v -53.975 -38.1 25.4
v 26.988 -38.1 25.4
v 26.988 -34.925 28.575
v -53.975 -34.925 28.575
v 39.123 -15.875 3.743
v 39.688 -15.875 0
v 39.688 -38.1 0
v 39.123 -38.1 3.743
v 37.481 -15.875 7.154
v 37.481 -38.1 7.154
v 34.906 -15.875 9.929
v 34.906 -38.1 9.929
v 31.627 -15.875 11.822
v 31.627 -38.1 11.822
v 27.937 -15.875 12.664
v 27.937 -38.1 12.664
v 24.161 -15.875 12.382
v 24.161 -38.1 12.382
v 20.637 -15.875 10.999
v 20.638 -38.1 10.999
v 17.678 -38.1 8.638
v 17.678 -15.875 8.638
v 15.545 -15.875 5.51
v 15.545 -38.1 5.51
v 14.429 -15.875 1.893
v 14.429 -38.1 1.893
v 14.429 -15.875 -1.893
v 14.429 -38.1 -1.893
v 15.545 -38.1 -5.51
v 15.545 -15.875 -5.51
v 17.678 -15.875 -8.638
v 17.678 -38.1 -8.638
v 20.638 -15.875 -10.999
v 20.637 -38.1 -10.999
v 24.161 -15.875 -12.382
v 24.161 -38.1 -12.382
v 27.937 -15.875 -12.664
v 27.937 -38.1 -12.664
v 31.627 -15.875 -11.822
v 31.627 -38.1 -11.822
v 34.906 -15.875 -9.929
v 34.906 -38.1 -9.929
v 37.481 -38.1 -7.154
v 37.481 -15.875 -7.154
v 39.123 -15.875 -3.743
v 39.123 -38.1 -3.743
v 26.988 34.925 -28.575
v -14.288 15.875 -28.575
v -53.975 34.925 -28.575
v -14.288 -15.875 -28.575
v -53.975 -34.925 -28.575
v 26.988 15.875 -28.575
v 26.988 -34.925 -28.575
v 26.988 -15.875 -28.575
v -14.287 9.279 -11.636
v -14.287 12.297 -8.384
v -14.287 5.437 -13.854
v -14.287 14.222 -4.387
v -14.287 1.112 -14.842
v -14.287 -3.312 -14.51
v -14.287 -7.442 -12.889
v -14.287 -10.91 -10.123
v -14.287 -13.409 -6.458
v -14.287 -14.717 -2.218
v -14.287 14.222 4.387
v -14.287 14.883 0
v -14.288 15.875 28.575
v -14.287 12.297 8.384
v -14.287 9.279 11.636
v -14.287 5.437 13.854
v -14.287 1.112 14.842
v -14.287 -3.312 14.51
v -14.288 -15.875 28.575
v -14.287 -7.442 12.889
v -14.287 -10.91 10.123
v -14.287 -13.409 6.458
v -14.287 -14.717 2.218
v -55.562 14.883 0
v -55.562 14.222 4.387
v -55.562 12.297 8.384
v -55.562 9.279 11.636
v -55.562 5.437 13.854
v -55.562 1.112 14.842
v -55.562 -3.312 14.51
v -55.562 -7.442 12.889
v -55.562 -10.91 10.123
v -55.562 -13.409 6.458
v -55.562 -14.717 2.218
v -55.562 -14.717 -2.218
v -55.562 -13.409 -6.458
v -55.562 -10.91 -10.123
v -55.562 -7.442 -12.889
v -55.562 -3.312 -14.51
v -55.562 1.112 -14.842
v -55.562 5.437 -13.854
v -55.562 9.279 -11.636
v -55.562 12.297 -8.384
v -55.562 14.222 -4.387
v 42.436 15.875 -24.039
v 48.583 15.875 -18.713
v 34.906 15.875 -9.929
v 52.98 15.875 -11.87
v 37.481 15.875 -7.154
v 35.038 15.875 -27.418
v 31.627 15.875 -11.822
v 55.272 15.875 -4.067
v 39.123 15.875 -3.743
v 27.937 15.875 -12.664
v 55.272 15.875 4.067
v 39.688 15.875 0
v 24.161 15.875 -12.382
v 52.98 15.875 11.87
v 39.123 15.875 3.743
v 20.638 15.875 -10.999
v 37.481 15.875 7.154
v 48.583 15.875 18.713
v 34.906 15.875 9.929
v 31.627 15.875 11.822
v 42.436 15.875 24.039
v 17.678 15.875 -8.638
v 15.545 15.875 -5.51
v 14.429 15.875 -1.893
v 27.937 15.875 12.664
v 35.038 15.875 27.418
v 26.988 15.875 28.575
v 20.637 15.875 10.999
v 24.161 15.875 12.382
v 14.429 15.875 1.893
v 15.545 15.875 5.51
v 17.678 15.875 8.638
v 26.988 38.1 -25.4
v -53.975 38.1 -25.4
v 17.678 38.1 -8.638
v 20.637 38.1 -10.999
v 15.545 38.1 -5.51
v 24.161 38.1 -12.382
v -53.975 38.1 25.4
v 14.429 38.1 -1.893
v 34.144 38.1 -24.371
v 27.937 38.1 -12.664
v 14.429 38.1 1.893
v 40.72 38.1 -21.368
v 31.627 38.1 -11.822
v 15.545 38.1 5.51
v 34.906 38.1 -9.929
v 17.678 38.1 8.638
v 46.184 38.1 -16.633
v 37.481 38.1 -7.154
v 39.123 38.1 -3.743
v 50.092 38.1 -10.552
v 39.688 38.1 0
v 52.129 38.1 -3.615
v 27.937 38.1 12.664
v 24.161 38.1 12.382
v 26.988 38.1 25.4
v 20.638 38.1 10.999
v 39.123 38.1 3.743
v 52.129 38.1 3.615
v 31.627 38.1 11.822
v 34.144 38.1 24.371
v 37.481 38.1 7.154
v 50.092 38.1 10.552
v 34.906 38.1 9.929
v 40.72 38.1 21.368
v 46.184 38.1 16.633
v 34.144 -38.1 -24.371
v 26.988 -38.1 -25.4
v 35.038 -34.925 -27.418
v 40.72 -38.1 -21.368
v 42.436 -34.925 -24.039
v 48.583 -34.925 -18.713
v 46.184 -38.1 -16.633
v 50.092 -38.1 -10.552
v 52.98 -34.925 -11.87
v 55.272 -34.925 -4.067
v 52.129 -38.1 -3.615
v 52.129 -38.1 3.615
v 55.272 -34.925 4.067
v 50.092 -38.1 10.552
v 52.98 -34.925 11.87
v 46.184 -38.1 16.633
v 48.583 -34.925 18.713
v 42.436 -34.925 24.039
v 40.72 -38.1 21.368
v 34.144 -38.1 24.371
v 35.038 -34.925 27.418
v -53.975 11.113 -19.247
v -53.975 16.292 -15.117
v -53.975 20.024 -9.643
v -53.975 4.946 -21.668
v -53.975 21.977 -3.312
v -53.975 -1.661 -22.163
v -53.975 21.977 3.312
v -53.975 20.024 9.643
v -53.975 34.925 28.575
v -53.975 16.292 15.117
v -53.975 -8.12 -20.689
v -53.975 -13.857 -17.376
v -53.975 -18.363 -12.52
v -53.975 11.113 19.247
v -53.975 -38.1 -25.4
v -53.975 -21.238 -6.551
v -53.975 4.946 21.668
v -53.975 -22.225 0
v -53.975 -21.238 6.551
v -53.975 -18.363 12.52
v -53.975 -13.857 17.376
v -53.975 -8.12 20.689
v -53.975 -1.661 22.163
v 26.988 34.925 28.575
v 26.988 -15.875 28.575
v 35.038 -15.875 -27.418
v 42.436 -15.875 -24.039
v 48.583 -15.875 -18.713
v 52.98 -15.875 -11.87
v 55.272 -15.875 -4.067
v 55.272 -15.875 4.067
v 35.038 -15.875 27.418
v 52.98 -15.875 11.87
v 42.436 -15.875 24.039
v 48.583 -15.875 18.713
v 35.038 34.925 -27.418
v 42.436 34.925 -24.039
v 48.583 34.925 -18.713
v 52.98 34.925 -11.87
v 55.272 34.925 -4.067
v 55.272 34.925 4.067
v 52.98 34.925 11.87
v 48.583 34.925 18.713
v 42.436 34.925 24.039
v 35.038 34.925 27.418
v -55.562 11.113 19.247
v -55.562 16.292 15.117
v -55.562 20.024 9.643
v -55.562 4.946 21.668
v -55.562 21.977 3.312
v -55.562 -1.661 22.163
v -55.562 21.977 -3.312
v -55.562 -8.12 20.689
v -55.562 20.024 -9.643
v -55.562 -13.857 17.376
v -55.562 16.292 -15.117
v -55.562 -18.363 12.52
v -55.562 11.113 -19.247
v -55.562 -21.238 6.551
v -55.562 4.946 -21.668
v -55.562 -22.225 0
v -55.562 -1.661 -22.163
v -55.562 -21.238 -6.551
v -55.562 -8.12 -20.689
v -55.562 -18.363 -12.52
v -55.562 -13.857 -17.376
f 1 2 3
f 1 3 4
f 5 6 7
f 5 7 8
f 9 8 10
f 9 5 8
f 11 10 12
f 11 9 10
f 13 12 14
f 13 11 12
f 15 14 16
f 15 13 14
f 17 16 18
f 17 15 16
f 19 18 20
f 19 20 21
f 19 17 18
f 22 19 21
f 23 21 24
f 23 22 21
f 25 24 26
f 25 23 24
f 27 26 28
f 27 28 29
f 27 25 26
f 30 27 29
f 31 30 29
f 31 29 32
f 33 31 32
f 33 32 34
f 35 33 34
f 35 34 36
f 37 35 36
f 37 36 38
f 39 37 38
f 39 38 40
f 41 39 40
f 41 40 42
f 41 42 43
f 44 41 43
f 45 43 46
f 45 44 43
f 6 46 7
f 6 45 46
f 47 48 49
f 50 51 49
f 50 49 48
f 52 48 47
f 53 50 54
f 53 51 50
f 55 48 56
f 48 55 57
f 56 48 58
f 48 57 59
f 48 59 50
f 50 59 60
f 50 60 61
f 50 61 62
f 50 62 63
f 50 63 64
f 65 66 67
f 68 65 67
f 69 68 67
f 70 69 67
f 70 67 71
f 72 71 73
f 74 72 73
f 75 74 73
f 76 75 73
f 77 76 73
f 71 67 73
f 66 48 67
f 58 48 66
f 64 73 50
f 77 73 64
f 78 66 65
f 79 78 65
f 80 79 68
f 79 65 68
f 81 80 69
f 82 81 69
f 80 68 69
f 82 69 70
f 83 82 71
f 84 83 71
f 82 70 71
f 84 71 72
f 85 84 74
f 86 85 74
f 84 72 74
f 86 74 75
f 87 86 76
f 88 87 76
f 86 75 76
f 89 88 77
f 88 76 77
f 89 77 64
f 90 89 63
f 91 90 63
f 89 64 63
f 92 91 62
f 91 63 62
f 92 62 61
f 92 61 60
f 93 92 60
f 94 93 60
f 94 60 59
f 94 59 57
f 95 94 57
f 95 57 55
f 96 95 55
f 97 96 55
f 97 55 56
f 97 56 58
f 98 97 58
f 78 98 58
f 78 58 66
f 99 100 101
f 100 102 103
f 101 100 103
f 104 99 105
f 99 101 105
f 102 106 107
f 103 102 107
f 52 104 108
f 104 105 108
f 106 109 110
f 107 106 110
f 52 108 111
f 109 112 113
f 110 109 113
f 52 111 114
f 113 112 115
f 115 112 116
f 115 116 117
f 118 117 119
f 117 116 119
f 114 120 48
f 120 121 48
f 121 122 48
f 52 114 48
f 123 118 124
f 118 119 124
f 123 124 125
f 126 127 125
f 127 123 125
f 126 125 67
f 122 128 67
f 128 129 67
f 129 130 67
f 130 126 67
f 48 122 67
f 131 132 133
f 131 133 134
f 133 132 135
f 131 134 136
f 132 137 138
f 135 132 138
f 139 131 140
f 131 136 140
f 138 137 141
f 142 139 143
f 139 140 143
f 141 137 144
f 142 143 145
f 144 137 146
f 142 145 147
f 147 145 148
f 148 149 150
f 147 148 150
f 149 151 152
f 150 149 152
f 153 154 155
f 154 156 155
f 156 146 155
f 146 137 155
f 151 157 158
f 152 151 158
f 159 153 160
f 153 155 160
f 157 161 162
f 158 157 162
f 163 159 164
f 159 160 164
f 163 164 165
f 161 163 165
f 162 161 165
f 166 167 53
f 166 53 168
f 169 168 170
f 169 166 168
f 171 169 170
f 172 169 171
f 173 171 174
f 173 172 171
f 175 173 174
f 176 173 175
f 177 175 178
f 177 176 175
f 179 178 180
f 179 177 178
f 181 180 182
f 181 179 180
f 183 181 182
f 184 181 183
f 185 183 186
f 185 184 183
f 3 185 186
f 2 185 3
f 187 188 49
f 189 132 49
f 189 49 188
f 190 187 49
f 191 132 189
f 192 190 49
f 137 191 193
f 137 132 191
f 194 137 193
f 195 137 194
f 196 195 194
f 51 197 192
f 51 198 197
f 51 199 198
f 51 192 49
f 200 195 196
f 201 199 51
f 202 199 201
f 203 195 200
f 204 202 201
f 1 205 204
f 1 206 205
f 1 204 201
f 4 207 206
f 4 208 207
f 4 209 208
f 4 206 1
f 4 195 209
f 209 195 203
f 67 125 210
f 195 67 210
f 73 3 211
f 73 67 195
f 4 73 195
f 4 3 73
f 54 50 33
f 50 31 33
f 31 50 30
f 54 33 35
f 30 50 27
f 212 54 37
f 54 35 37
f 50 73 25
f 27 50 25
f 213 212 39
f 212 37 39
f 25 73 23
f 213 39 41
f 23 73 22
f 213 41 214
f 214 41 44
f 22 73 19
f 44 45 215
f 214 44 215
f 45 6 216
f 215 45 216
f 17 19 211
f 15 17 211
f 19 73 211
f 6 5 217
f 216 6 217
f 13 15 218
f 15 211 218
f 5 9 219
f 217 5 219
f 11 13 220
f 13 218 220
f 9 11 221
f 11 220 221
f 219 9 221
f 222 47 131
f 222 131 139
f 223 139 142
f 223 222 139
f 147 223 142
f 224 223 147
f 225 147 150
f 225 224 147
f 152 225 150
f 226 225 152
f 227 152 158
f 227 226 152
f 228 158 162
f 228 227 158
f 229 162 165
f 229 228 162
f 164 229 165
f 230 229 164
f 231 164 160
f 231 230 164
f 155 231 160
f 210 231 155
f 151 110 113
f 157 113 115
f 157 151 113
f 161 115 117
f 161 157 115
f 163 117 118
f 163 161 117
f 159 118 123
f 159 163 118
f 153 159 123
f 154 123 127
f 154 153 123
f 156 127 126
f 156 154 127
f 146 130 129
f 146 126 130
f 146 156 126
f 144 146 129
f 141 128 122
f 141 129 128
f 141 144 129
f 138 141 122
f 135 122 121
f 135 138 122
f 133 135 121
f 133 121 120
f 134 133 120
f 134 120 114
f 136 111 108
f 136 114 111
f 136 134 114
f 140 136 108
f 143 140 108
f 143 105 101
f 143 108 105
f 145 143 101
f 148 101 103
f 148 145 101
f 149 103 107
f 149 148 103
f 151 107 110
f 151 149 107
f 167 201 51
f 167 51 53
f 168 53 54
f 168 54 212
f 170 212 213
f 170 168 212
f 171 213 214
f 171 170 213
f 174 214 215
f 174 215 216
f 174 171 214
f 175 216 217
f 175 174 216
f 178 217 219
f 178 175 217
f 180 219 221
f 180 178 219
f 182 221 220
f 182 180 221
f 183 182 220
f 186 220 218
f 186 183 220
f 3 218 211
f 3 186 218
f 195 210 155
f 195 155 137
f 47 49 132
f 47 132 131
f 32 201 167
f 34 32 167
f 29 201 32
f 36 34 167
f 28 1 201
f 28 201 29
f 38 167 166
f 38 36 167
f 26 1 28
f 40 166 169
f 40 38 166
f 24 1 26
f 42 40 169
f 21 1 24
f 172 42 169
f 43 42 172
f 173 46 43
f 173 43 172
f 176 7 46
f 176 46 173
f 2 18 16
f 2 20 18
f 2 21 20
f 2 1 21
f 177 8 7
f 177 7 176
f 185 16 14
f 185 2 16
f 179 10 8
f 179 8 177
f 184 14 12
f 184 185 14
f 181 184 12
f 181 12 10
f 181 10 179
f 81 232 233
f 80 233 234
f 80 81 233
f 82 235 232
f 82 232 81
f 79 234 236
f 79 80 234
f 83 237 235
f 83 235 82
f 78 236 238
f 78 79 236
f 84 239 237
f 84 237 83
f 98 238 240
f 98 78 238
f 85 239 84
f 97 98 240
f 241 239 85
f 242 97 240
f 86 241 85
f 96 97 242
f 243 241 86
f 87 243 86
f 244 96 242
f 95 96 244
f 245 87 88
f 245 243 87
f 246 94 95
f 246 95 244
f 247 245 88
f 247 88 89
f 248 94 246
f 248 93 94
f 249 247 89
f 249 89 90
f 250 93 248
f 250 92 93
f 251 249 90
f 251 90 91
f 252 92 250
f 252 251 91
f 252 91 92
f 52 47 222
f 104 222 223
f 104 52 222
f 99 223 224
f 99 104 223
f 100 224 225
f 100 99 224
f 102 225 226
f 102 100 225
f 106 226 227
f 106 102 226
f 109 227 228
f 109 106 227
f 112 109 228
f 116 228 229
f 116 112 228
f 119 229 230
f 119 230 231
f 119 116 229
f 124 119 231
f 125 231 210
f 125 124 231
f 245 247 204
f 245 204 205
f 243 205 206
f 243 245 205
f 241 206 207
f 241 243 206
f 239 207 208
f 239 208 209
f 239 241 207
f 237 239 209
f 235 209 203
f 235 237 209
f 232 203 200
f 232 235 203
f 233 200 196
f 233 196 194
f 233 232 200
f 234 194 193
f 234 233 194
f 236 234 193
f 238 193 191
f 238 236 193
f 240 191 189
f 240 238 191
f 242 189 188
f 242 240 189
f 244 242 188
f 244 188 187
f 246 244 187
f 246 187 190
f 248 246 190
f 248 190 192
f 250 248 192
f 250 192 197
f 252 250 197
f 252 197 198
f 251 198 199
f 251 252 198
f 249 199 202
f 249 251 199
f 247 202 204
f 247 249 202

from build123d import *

# Parameters (mm, degrees)
F0_R     = 12.7
F1_DEPTH = 38.1
F3_DEPTH = 38.1
F5_D     = 29.76626
F4_W     = 76.2
F4_H     = 57.15
F4_R     = 22.225
F6_DEPTH = 1.5875
F7_SIZE  = 3.175


with BuildPart() as f1:
    # F0 (on Front) → F1 (new body, symmetric)
    with BuildSketch(Plane.XZ):
        with BuildLine():
            Line((-55.5625, 28.575), (-55.5625, -28.575))
            Line((-55.5625, -28.575), (26.9875, -28.575))
            ThreePointArc((26.9875, -28.575), (55.5625, 0), (26.9875, 28.575))
            Line((26.9875, 28.575), (-55.5625, 28.575))
        make_face()
        with Locations((26.9875, 0)):
            Circle(F0_R, mode=Mode.SUBTRACT)
    extrude(amount=F1_DEPTH, both=True)

    # F2 (on Top) → F3 (cut, symmetric)
    with BuildSketch(Plane.XY):
        Polygon((55.5625, 0), (55.5625, 15.875), (-14.2875, 15.875), (-14.2875, 0), (-14.2875, -15.875), (55.5625, -15.875), align=None)
    extrude(amount=F3_DEPTH, both=True, mode=Mode.SUBTRACT)

    # F5 (through all)
    with Locations(Plane(origin=(-55.5625, 0, 0), x_dir=(0, -1, 0), z_dir=(-1, 0, 0))):
        with Locations((0, 0)):
            Hole(F5_D / 2)

    # F4 (on face) → F6 (cut)
    with BuildSketch(Plane(origin=(-55.5625, 0, 0), x_dir=(0, -1, 0), z_dir=(-1, 0, 0))):
        Rectangle(F4_W, F4_H)
        Circle(F4_R, mode=Mode.SUBTRACT)
    extrude(amount=-F6_DEPTH, mode=Mode.SUBTRACT)

    # F7
    f7_edges = [f1.edges().sort_by_distance(p)[0] for p in [
        (-13.49375, 38.1, 28.575),
        (-13.49375, -38.1, -28.575),
    ]]
    chamfer(f7_edges, length=F7_SIZE)


solid = f1.part
